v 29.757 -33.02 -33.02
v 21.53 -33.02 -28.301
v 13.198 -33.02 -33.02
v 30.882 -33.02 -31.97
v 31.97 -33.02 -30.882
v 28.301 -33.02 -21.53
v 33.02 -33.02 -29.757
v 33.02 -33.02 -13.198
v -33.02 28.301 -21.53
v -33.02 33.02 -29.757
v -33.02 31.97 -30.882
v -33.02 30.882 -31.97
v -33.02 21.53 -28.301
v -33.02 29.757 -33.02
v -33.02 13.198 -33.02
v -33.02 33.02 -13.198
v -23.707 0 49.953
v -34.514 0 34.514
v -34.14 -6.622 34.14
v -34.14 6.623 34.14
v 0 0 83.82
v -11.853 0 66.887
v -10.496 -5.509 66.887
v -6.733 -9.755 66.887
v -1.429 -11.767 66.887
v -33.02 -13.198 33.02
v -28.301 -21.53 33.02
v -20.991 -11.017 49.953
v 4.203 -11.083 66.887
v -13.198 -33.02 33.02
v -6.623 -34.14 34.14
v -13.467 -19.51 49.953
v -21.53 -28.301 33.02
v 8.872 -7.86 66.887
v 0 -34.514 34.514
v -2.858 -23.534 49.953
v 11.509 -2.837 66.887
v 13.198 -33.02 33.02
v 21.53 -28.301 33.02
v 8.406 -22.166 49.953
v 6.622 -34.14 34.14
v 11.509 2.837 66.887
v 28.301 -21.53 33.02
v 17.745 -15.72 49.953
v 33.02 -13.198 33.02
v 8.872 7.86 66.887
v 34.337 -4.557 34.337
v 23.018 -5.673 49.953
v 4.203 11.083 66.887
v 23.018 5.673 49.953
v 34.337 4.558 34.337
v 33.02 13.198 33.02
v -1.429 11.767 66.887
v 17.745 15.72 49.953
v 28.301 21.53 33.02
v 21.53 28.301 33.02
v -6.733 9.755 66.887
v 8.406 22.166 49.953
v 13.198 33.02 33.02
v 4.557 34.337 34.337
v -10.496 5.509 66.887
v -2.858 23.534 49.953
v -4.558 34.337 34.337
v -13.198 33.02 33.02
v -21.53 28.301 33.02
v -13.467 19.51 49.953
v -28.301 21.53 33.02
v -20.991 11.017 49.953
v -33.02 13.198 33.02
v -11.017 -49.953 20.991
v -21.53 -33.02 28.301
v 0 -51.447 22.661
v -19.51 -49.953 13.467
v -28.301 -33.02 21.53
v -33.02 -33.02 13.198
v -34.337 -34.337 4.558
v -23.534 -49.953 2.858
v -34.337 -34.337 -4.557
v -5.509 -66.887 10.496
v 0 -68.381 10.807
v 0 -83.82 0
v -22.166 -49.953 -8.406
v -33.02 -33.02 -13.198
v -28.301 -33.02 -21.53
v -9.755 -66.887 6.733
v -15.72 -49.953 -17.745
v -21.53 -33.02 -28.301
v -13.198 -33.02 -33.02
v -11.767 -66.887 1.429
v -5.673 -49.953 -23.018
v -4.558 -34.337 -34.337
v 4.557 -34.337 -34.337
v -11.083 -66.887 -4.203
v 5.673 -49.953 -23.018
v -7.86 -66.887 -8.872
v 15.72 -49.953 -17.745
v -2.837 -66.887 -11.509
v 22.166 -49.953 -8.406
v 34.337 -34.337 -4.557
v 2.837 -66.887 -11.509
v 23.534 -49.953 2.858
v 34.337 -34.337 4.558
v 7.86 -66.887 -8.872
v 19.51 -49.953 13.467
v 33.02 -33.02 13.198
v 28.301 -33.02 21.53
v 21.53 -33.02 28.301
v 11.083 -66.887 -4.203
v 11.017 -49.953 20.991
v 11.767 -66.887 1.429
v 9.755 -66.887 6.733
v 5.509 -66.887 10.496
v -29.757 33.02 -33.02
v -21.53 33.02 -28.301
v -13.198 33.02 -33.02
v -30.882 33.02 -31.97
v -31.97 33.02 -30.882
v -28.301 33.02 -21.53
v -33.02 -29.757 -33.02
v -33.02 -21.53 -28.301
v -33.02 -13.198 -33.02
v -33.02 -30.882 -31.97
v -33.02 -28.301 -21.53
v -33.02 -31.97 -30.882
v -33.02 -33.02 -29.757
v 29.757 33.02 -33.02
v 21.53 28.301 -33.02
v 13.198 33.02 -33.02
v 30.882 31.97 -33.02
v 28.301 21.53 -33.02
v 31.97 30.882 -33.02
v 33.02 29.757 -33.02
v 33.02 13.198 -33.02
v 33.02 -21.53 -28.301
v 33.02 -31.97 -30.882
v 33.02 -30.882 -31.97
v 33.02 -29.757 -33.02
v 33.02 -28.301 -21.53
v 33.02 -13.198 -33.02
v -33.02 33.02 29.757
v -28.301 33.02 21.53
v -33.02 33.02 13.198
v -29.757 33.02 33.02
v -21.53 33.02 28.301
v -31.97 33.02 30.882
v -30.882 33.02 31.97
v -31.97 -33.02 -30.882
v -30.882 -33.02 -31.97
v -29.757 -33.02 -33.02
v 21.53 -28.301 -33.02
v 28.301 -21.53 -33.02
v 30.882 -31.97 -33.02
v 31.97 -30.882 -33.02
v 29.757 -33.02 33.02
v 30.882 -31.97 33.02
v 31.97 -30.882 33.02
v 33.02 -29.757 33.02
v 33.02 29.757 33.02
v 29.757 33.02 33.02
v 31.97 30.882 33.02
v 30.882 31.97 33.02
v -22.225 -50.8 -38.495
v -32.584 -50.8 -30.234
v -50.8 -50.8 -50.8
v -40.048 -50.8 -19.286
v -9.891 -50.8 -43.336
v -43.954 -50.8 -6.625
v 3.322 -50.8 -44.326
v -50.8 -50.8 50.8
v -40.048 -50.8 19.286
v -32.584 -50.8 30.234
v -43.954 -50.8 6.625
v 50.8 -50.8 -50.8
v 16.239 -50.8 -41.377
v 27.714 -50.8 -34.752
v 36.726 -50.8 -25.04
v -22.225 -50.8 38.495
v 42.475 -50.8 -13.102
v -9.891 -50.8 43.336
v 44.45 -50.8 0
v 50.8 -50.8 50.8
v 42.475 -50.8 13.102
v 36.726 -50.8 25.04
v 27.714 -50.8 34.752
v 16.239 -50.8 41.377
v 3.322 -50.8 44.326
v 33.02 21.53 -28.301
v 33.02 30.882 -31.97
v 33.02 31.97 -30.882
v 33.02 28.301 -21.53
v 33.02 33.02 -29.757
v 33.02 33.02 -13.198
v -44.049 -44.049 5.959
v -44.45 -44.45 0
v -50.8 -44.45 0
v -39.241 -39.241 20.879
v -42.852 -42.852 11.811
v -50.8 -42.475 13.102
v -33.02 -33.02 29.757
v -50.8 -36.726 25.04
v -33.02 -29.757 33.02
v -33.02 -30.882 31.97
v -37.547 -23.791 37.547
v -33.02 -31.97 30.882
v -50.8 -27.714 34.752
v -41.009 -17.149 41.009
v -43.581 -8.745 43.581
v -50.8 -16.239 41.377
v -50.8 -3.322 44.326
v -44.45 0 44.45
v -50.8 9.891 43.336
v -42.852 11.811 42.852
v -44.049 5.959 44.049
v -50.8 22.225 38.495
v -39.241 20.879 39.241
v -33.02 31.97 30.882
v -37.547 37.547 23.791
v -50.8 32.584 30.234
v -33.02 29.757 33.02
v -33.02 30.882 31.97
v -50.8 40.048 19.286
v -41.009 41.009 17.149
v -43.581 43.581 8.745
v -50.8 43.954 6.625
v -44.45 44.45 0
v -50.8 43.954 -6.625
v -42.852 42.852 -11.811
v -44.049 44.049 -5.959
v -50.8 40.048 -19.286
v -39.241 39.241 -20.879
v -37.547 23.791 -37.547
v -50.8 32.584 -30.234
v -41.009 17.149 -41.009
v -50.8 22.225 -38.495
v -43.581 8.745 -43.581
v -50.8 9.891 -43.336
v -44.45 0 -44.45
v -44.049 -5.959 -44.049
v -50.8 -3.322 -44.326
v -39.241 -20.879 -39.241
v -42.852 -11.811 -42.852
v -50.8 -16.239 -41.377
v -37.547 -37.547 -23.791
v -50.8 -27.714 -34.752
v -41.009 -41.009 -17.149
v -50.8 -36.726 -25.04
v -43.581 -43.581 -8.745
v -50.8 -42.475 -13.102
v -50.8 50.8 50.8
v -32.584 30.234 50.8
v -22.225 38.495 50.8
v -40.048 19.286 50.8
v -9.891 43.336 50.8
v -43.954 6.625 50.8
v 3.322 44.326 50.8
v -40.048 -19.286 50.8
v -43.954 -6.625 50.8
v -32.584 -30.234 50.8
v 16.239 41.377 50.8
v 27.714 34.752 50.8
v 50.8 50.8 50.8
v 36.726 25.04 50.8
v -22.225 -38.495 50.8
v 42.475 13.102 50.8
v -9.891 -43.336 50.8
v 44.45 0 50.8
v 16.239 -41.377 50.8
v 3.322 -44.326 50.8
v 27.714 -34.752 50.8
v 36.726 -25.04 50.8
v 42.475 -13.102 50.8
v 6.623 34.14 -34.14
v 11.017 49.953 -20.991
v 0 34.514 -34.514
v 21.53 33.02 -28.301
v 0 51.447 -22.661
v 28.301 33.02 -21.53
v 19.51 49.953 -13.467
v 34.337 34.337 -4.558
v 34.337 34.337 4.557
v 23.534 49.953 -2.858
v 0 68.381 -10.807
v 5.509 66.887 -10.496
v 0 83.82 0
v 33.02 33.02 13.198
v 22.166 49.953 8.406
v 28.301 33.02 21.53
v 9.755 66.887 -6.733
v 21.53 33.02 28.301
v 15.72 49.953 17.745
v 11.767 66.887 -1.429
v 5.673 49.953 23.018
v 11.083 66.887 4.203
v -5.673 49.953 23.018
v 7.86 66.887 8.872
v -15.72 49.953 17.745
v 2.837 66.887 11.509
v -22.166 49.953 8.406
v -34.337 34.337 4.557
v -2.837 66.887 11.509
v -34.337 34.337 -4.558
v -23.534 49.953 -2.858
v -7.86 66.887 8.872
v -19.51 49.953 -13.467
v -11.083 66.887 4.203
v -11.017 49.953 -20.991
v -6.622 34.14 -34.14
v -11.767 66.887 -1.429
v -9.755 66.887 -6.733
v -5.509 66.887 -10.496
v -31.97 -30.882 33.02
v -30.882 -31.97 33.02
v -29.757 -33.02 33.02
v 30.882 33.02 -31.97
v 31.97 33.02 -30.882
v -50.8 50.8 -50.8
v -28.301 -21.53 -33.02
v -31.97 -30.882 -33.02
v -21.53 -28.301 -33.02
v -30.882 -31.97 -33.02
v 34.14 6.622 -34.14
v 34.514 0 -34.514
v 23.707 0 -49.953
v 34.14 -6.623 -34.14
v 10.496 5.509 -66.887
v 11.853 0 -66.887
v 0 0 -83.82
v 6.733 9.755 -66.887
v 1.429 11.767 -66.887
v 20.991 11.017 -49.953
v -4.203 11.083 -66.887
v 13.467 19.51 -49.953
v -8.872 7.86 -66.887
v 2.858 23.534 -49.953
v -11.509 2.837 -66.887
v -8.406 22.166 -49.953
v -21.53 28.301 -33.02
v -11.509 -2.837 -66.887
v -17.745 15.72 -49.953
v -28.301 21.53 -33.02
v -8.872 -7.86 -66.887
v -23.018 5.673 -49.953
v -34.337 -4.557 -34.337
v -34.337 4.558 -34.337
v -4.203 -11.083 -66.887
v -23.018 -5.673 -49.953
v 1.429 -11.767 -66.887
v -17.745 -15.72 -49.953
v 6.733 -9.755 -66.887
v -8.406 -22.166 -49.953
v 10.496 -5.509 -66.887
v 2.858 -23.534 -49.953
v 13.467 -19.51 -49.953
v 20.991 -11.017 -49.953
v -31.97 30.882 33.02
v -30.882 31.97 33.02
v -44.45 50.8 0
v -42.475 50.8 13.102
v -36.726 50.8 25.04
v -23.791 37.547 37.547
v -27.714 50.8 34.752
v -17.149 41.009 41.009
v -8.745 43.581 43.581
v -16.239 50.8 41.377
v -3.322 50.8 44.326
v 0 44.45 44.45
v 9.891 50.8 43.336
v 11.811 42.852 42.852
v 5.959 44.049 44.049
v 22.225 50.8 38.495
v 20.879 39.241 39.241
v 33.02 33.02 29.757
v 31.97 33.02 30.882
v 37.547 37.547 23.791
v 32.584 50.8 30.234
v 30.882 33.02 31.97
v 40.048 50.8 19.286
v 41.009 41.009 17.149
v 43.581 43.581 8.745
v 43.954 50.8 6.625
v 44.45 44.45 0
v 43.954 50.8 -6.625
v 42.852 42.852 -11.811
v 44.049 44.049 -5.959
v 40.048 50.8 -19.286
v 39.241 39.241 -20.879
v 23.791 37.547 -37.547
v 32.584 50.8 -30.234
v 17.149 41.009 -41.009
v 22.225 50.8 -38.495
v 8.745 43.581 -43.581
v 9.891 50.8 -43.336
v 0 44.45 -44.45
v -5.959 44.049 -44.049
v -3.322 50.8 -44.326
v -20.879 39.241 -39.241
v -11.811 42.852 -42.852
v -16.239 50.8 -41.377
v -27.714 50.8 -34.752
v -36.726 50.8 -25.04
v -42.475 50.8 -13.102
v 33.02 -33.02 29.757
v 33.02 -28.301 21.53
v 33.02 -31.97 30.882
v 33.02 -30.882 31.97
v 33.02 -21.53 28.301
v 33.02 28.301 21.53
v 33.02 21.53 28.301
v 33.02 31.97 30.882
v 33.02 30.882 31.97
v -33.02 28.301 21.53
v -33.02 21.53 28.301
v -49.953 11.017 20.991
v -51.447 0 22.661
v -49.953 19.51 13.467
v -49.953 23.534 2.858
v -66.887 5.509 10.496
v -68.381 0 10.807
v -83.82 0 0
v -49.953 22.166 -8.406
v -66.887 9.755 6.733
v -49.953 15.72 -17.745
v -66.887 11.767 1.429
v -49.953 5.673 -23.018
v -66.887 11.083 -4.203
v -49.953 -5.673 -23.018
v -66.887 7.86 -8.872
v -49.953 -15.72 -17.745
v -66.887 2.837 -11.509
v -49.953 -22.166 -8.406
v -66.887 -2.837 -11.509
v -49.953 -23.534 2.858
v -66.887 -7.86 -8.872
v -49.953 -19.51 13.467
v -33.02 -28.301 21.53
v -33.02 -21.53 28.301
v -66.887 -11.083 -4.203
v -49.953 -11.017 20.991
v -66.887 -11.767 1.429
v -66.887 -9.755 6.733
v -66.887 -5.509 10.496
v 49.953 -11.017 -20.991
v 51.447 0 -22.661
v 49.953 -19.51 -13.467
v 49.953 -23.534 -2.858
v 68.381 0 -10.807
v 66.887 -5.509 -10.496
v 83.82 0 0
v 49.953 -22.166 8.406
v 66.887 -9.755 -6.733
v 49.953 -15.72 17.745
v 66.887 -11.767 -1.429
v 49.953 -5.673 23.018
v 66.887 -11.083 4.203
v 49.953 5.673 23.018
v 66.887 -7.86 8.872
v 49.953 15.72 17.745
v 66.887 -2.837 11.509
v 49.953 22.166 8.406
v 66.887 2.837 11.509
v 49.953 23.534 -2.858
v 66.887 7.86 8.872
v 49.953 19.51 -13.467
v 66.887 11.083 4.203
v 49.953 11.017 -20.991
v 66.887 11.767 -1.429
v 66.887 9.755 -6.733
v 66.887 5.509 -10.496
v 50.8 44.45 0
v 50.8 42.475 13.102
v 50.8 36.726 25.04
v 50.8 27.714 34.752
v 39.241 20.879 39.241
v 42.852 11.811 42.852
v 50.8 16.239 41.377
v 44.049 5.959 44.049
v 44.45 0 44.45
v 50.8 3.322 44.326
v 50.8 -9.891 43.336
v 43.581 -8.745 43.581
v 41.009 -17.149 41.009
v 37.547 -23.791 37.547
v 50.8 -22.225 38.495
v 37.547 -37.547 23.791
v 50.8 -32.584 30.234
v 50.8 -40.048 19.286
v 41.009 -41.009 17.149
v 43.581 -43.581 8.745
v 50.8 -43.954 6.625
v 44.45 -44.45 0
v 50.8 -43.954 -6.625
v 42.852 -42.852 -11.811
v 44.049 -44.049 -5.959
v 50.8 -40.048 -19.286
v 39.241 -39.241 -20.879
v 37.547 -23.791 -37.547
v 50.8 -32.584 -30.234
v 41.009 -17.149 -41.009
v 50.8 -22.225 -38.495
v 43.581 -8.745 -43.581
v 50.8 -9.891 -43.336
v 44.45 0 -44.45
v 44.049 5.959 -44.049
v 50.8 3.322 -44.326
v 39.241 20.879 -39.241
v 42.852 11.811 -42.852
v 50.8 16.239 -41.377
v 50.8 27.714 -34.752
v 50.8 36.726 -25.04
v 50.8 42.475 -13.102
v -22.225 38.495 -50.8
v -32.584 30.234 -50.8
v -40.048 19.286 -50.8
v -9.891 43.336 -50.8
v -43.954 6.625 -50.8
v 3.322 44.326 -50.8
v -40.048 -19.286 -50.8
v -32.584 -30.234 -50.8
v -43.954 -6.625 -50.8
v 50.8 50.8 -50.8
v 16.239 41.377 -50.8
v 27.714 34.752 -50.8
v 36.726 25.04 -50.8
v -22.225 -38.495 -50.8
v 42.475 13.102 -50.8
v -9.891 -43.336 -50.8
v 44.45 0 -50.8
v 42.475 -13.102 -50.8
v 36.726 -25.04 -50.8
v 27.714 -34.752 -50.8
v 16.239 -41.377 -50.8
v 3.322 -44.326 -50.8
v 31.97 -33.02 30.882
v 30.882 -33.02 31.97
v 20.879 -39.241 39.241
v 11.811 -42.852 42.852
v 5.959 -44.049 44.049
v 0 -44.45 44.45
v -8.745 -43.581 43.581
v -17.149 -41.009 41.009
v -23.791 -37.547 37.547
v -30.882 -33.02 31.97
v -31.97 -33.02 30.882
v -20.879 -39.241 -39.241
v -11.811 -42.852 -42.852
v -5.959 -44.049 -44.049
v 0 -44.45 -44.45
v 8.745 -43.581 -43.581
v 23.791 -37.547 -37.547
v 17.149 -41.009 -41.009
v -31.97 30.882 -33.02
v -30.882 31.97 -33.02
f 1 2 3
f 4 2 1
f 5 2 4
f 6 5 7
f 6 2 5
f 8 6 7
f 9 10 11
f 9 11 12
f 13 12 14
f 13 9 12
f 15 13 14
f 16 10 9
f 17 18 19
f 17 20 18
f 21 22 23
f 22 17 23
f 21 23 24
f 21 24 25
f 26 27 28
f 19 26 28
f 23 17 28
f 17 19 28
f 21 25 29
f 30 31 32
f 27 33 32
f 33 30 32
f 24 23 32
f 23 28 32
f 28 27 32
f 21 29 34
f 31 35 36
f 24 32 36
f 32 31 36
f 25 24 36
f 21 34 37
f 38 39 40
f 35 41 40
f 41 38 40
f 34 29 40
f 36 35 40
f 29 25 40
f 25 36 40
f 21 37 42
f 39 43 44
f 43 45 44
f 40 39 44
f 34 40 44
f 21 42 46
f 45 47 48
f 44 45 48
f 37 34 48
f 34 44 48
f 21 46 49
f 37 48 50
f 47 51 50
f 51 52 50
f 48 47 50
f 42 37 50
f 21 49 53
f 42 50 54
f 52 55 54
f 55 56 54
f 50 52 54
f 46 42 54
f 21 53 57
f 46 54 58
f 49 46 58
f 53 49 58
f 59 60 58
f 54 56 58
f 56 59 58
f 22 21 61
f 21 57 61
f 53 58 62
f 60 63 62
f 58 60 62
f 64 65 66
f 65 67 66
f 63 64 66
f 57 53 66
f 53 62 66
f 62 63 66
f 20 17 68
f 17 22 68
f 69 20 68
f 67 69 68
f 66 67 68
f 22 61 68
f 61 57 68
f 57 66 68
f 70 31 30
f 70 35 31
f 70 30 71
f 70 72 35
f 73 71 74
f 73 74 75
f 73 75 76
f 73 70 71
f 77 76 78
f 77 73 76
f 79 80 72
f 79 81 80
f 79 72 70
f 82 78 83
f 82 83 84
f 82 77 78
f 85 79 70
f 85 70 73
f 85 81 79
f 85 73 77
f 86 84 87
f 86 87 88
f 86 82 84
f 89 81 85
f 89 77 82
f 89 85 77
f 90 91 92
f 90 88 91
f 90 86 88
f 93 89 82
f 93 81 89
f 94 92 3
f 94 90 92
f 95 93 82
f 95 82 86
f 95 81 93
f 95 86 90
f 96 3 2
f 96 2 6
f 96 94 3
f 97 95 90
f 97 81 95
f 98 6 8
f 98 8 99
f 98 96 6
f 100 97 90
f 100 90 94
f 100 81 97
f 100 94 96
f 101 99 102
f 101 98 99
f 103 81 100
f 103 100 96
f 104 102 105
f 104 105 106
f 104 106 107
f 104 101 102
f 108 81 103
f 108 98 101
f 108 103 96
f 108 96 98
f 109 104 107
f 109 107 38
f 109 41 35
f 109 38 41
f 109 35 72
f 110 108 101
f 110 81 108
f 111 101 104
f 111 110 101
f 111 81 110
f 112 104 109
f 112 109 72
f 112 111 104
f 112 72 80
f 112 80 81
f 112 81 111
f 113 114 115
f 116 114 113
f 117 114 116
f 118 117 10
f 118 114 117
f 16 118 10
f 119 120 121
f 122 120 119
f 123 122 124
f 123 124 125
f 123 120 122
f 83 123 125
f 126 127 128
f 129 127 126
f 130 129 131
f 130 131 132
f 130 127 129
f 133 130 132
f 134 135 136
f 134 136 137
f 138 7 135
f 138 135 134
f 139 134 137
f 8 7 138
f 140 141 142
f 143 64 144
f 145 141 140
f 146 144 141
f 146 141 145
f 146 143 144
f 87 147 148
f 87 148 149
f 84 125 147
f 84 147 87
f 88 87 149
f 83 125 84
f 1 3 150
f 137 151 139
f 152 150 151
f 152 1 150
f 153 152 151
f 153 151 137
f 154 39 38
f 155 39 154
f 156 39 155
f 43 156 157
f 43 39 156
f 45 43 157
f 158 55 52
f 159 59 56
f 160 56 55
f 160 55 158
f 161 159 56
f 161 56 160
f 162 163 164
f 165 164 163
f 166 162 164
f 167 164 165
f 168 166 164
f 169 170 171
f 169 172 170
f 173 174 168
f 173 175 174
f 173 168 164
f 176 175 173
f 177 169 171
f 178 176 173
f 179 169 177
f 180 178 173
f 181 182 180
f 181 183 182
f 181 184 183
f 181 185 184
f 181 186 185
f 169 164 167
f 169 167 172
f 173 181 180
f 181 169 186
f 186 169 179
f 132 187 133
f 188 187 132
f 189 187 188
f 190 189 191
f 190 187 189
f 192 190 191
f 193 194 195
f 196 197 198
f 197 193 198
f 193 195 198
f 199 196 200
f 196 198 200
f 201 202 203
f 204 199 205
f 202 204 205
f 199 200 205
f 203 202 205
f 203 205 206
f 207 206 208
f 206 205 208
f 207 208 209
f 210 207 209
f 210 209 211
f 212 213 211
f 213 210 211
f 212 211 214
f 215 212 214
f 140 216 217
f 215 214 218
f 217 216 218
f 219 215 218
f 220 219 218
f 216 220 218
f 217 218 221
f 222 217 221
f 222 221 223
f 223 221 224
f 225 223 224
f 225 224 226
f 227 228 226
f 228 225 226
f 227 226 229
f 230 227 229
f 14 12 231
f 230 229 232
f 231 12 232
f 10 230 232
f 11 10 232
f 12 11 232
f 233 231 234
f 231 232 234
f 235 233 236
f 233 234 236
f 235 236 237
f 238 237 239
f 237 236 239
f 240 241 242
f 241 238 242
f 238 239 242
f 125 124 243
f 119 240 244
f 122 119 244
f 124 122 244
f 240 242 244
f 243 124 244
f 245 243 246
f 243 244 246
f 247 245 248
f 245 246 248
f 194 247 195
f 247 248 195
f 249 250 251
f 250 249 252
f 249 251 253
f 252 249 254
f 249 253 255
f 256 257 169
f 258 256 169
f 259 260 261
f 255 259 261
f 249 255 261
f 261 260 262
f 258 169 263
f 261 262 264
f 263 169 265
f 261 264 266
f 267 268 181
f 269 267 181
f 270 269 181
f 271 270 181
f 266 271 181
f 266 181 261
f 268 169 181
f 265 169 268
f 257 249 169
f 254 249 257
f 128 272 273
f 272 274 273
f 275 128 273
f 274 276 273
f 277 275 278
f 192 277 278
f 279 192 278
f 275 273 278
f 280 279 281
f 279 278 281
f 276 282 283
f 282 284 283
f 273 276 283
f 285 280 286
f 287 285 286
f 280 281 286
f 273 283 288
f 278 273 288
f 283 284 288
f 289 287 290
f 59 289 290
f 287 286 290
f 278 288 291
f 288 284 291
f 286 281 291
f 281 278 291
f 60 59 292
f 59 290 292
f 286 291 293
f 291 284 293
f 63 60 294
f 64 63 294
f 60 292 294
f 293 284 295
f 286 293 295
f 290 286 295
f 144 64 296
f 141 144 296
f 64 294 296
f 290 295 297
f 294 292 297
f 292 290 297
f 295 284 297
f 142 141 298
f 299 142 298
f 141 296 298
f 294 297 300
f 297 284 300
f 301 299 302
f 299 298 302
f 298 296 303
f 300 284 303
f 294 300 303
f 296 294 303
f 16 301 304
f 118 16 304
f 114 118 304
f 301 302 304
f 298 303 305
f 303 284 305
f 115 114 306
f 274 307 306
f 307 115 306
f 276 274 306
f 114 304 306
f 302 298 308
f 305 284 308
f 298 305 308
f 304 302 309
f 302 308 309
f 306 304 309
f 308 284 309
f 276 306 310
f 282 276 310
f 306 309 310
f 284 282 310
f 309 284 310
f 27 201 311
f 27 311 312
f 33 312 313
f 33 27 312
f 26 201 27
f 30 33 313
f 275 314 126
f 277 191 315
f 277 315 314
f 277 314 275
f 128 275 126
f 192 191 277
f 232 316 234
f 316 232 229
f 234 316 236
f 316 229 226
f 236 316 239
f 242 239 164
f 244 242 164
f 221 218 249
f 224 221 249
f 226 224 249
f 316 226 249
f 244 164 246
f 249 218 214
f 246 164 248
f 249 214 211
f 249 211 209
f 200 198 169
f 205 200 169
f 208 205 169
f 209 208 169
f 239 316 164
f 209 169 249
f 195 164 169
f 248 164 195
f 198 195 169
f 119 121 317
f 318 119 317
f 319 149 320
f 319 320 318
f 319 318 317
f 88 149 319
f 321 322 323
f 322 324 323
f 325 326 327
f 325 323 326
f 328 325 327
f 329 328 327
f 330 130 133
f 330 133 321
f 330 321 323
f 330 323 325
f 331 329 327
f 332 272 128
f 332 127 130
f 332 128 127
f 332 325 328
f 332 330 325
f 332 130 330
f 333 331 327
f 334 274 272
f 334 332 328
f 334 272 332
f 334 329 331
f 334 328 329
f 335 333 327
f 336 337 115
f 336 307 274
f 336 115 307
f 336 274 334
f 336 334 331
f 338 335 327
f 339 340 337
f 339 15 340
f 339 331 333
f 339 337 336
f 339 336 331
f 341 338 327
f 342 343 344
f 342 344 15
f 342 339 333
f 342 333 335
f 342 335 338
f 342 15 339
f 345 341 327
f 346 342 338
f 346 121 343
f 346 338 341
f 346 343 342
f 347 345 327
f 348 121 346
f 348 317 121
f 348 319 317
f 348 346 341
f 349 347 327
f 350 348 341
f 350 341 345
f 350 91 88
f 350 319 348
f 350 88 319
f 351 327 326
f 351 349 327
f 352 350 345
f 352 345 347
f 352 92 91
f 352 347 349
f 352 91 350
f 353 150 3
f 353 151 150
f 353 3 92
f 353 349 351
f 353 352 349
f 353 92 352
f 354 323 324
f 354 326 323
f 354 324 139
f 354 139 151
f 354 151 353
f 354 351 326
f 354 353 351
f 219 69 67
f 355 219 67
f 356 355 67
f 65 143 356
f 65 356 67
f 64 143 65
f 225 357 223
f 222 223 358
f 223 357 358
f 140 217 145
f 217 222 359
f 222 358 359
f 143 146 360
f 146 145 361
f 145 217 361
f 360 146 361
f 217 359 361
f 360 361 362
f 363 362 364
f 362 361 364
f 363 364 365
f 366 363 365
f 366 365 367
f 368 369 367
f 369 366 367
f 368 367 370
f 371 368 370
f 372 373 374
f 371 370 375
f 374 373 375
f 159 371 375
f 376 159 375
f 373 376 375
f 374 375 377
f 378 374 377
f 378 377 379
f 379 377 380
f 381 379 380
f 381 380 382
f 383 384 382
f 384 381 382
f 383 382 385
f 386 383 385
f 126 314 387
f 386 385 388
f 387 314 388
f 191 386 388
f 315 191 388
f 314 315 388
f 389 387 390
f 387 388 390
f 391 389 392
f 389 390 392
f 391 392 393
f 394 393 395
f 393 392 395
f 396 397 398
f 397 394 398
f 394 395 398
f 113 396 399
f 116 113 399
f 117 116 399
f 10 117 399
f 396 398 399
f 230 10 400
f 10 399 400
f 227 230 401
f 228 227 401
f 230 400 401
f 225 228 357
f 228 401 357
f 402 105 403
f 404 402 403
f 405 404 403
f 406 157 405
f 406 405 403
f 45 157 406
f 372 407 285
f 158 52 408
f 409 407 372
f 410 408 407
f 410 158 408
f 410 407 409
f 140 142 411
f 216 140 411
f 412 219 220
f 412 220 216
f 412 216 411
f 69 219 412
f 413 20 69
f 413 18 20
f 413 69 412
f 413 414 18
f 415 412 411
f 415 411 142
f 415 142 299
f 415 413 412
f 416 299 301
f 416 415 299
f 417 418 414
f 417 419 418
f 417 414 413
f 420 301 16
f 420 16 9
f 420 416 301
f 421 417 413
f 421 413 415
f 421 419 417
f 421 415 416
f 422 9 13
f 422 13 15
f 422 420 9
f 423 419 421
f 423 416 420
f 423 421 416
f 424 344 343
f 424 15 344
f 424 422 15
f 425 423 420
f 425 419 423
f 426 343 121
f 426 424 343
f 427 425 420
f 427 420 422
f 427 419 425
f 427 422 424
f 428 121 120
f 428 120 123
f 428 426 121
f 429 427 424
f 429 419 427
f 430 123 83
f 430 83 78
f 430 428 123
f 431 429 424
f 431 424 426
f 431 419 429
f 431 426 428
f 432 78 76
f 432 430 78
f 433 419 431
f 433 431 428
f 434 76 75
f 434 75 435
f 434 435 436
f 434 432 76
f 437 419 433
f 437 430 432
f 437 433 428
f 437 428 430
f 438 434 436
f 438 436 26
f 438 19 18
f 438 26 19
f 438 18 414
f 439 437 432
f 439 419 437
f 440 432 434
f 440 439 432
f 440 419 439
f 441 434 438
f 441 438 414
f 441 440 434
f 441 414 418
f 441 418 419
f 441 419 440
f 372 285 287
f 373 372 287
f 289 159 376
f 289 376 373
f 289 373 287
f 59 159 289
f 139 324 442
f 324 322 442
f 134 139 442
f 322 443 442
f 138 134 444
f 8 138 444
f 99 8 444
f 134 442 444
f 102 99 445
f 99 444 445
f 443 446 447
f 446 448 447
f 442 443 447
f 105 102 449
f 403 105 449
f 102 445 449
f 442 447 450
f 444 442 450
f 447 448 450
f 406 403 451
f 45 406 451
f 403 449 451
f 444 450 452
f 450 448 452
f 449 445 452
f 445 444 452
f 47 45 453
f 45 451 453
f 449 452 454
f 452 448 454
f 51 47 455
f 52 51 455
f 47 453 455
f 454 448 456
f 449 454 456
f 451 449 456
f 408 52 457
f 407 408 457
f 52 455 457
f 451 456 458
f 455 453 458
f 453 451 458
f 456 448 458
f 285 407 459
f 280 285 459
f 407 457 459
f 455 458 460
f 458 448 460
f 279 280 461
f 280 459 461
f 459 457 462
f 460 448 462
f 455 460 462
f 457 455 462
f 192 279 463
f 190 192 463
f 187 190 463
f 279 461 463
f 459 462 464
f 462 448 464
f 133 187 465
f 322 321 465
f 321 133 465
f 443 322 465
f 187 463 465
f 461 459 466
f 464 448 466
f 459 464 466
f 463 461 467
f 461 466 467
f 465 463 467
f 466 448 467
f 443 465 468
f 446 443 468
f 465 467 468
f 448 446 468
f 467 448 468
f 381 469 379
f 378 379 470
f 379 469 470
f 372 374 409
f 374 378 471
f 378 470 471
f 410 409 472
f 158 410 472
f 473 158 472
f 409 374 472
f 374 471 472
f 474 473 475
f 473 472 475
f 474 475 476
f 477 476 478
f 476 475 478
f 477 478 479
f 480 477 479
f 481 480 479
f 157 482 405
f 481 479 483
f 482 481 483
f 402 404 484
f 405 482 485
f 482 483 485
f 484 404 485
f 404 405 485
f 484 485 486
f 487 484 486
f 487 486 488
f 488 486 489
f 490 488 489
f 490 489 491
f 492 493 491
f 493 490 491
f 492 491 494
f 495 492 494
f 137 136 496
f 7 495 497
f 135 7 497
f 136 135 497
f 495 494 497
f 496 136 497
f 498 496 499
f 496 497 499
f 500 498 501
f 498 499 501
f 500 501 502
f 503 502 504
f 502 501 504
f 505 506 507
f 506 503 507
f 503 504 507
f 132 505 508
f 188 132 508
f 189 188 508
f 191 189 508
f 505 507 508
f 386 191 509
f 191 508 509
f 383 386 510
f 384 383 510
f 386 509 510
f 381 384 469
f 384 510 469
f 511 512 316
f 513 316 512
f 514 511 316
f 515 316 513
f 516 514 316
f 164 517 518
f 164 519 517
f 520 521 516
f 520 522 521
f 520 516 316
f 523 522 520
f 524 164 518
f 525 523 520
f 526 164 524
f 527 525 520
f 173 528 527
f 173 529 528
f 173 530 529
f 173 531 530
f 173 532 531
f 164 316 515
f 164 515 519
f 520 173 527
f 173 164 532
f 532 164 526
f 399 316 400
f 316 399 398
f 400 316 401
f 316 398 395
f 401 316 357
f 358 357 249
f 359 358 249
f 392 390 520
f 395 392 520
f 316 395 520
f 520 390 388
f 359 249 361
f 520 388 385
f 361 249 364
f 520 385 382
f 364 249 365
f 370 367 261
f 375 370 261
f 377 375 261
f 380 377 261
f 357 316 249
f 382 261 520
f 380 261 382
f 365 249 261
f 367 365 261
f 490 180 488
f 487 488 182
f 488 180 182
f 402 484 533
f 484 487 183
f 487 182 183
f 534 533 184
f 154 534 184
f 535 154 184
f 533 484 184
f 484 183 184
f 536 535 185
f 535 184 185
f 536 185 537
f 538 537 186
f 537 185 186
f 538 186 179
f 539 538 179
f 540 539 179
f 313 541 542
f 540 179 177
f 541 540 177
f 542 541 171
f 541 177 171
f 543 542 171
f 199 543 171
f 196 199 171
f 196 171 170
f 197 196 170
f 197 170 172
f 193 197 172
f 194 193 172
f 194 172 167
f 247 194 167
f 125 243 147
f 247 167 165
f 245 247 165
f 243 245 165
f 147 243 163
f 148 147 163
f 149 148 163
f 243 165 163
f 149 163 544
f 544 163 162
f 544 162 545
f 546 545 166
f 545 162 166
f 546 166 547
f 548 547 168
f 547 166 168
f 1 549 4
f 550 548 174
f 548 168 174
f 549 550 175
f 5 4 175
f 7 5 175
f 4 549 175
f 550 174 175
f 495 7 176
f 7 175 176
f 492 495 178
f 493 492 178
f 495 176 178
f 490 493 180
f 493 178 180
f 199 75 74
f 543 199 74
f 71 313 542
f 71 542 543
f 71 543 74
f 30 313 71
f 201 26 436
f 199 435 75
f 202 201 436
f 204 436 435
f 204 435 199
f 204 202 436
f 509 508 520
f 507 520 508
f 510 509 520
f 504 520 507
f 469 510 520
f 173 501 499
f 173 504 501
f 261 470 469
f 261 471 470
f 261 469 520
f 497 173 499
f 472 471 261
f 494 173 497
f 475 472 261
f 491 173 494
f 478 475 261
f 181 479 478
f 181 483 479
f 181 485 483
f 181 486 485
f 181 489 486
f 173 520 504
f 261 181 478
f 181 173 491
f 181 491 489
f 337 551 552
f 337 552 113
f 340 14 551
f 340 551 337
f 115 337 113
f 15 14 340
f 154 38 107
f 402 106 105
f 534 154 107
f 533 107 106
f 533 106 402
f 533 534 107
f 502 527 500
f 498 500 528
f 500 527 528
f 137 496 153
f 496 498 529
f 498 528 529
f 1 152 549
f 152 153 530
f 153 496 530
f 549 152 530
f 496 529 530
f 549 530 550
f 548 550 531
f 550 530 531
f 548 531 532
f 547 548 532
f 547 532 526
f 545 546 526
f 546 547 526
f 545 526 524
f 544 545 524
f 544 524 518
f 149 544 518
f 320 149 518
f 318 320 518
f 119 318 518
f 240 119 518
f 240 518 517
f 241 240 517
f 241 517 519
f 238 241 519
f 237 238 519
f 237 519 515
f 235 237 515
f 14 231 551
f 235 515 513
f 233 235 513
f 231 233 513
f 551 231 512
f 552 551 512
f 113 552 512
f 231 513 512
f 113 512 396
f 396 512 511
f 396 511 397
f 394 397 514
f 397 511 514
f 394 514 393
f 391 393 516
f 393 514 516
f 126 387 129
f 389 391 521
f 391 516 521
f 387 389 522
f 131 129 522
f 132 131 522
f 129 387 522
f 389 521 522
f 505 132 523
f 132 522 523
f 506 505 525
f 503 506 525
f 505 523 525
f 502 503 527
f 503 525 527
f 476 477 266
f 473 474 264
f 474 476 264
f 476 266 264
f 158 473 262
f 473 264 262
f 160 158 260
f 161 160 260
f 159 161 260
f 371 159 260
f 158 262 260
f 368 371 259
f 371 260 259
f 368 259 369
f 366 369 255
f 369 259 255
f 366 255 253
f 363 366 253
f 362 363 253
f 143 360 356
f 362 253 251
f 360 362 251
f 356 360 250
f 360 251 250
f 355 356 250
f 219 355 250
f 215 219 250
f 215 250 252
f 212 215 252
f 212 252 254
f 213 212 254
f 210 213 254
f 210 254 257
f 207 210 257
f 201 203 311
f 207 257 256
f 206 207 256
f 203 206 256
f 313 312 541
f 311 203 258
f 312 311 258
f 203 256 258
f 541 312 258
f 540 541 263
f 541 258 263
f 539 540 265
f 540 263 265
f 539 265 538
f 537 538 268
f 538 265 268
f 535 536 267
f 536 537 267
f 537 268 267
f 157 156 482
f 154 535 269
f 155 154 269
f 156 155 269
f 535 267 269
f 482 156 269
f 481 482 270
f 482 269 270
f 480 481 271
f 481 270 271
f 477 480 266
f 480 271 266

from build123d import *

# Parameters (mm, degrees)
F0_W      = 101.6
F0_H      = 101.6
F1_DEPTH  = 50.8
F2_R      = 44.45
F3_DEPTH  = 17.78
F4_R      = 44.45
F5_DEPTH  = 17.78
F6_R      = 44.45
F7_DEPTH  = 17.78
F8_R      = 44.45
F9_DEPTH  = 17.78
F10_R     = 44.45
F11_DEPTH = 17.78
F12_R     = 44.45
F13_DEPTH = 17.78


with BuildPart() as f1:
    # F0 (on Front) → F1 (new body, symmetric)
    with BuildSketch(Plane.XZ):
        Rectangle(F0_W, F0_H)
    extrude(amount=F1_DEPTH, both=True)

    # F2 (on face) → F3 (cut)
    with BuildSketch(Plane.XZ.offset(50.8)):
        Circle(F2_R)
    extrude(amount=-F3_DEPTH, mode=Mode.SUBTRACT)

    # F4 (on face) → F5 (cut)
    with BuildSketch(Plane(origin=(0, 0, -50.8), x_dir=(1, 0, 0), z_dir=(0, 0, -1))):
        Circle(F4_R)
    extrude(amount=-F5_DEPTH, mode=Mode.SUBTRACT)

    # F6 (on face) → F7 (cut)
    with BuildSketch(Plane.YZ.offset(50.8)):
        Circle(F6_R)
    extrude(amount=-F7_DEPTH, mode=Mode.SUBTRACT)

    # F8 (on face) → F9 (cut)
    with BuildSketch(Plane.XY.offset(50.8)):
        Circle(F8_R)
    extrude(amount=-F9_DEPTH, mode=Mode.SUBTRACT)

    # F10 (on face) → F11 (cut)
    with BuildSketch(Plane(origin=(0, 50.8, 0), x_dir=(-1, 0, 0), z_dir=(0, 1, 0))):
        Circle(F10_R)
    extrude(amount=-F11_DEPTH, mode=Mode.SUBTRACT)

    # F12 (on face) → F13 (cut)
    with BuildSketch(Plane(origin=(-50.8, 0, 0), x_dir=(0, -1, 0), z_dir=(-1, 0, 0))):
        Circle(F12_R)
    extrude(amount=-F13_DEPTH, mode=Mode.SUBTRACT)

    # F14 (on Front) → F15 (revolve)
    with BuildSketch(Plane.XZ):
        Polygon((-35.56, 33.02), (0, 33.02), (0, 83.82), align=None)
        Polygon((35.56, -33.02), (0, -33.02), (0, -83.82), align=None)
    revolve(axis=Axis((0, 0, -58.42), (0, 0, 1)))

    # F16 (on Front) → F17 (revolve)
    with BuildSketch(Plane.XZ):
        Polygon((-83.82, 0), (-33.02, 0), (-33.02, 35.56), align=None)
        Polygon((83.82, 0), (33.02, 0), (33.02, -35.56), align=None)
    revolve(axis=Axis((58.42, 0, 0), (-1, 0, 0)))

    # F18 (on Right) → F19 (revolve)
    with BuildSketch(Plane.YZ):
        Polygon((-83.82, 0), (-33.02, 0), (-33.02, 35.56), align=None)
        Polygon((83.82, 0), (33.02, 0), (33.02, -35.56), align=None)
    revolve(axis=Axis((0, 58.42, 0), (0, -1, 0)))


solid = f1.part
